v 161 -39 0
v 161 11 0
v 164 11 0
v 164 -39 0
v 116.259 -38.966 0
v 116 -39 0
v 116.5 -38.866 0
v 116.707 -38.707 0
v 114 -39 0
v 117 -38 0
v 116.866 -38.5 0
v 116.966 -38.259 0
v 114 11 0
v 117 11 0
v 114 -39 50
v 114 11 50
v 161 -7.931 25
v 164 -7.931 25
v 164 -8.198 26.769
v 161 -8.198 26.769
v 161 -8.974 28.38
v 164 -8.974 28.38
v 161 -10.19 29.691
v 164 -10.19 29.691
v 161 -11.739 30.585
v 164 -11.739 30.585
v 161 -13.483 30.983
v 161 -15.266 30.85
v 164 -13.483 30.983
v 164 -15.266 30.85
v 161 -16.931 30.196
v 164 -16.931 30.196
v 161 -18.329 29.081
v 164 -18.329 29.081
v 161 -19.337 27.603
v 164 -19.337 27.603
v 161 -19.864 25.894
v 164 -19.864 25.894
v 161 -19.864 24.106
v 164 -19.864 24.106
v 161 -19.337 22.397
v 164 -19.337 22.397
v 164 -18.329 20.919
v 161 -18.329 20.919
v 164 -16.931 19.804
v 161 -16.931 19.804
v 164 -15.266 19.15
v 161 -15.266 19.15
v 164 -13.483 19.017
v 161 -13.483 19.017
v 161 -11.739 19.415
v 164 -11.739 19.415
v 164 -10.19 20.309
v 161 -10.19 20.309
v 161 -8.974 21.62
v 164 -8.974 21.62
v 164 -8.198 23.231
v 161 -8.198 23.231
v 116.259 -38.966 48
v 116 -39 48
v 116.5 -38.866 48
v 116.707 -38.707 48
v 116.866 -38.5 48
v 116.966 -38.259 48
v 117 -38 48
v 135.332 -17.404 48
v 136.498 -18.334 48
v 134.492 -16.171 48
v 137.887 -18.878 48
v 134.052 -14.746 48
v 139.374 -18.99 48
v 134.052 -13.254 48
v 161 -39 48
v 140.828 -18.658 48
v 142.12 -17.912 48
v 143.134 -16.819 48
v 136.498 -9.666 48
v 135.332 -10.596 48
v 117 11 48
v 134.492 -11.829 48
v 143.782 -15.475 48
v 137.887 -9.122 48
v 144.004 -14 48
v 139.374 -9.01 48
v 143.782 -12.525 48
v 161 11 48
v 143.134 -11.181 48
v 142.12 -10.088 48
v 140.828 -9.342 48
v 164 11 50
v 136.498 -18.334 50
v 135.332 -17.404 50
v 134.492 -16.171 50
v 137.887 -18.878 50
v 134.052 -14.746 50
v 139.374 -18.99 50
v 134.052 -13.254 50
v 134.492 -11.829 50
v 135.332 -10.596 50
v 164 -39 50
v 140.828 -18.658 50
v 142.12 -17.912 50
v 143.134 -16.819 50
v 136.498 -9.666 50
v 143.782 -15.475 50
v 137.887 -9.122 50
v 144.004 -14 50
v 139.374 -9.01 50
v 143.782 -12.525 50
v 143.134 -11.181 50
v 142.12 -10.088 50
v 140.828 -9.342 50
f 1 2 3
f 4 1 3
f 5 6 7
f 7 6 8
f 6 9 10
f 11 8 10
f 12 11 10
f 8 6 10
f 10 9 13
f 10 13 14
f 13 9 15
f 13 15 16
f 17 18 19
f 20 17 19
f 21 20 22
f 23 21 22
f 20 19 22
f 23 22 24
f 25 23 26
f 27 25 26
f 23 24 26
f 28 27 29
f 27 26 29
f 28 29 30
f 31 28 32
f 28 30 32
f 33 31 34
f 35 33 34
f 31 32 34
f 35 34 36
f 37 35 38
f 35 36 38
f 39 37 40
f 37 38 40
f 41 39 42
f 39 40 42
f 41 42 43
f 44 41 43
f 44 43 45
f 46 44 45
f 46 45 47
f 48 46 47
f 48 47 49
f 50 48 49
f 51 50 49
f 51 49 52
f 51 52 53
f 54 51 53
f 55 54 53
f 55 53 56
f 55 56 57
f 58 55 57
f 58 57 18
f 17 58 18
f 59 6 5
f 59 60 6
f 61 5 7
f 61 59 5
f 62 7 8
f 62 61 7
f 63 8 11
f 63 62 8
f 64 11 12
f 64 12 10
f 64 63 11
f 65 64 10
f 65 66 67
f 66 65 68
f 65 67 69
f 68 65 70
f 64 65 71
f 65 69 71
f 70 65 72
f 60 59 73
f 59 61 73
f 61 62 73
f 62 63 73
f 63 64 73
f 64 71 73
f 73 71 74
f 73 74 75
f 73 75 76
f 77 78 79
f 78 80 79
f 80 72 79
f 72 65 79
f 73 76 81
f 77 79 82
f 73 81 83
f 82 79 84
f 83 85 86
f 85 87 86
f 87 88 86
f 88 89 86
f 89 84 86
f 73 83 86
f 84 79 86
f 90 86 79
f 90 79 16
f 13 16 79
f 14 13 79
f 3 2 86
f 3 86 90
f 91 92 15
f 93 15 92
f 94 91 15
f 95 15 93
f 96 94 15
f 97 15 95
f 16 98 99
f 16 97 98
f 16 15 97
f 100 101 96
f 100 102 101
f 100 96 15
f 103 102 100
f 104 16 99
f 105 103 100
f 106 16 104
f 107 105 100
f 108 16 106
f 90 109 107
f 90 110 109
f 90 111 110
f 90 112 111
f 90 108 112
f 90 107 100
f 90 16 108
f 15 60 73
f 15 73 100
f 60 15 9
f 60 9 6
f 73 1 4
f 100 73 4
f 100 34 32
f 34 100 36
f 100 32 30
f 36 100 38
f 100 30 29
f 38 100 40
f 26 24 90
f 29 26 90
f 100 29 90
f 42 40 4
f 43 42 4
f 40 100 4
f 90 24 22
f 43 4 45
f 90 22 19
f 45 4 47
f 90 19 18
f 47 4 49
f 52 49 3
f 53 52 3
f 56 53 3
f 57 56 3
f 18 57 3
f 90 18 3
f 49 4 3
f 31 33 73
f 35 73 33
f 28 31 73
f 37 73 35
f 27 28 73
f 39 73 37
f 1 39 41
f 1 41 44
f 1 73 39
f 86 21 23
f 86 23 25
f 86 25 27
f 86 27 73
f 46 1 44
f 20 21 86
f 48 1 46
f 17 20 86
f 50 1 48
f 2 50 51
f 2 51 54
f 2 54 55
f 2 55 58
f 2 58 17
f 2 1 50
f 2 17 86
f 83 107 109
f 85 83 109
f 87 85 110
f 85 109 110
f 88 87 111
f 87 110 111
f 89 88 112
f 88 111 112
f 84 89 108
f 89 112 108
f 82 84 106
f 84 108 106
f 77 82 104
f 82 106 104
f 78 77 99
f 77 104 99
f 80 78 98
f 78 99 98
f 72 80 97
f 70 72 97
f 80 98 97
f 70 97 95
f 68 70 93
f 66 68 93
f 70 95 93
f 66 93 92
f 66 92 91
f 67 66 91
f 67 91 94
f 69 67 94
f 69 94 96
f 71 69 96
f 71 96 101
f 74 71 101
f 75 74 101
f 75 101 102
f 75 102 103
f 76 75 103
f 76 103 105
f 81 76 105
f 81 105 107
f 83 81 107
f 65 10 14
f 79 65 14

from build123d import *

# Parameters (mm, degrees)
BOX003_W        = 44
BOX003_H        = 60
BOX003_DEPTH    = 50
BOX002_W        = 50
BOX002_H        = 50
BOX002_DEPTH    = 50
SKETCH002_R     = 5.003926
POCKET001_DEPTH = 58
SKETCH003_R     = 6
POCKET002_DEPTH = 5
FILLET_R        = 1


with BuildPart() as cubo003:
    # Box003 → Box003 (new body)
    with BuildSketch(Plane(origin=(117, -42, -2), x_dir=(1, 0, 0), z_dir=(0, 0, 1))):
        with Locations((22, 30)):
            Rectangle(BOX003_W, BOX003_H)
    extrude(amount=BOX003_DEPTH)


with BuildPart() as fillet_body:
    # Box002 → Box002 (new body)
    with BuildSketch(Plane(origin=(114, -39, 0), x_dir=(1, 0, 0), z_dir=(0, 0, 1))):
        with Locations((25, 25)):
            Rectangle(BOX002_W, BOX002_H)
    extrude(amount=BOX002_DEPTH)

    # Sketch002 → Pocket001 (cut)
    with BuildSketch(Plane(origin=(114, -39, 50), x_dir=(1, 0, 0), z_dir=(0, 0, 1))):
        with Locations((25, 25)):
            Circle(SKETCH002_R)
    extrude(amount=-POCKET001_DEPTH, mode=Mode.SUBTRACT)

    # Cut003: cut Cubo003
    add(cubo003.part, mode=Mode.SUBTRACT)

    # Sketch003 → Pocket002 (cut)
    with BuildSketch(Plane.YZ.offset(164)):
        with Locations((-13.931141, 25)):
            Circle(SKETCH003_R)
    extrude(amount=-POCKET002_DEPTH, mode=Mode.SUBTRACT)

    # Fillet
    fillet_edges = [fillet_body.edges().sort_by_distance(p)[0] for p in [
        (117, -39, 24),
    ]]
    fillet(fillet_edges, radius=FILLET_R)


solid = fillet_body.part
